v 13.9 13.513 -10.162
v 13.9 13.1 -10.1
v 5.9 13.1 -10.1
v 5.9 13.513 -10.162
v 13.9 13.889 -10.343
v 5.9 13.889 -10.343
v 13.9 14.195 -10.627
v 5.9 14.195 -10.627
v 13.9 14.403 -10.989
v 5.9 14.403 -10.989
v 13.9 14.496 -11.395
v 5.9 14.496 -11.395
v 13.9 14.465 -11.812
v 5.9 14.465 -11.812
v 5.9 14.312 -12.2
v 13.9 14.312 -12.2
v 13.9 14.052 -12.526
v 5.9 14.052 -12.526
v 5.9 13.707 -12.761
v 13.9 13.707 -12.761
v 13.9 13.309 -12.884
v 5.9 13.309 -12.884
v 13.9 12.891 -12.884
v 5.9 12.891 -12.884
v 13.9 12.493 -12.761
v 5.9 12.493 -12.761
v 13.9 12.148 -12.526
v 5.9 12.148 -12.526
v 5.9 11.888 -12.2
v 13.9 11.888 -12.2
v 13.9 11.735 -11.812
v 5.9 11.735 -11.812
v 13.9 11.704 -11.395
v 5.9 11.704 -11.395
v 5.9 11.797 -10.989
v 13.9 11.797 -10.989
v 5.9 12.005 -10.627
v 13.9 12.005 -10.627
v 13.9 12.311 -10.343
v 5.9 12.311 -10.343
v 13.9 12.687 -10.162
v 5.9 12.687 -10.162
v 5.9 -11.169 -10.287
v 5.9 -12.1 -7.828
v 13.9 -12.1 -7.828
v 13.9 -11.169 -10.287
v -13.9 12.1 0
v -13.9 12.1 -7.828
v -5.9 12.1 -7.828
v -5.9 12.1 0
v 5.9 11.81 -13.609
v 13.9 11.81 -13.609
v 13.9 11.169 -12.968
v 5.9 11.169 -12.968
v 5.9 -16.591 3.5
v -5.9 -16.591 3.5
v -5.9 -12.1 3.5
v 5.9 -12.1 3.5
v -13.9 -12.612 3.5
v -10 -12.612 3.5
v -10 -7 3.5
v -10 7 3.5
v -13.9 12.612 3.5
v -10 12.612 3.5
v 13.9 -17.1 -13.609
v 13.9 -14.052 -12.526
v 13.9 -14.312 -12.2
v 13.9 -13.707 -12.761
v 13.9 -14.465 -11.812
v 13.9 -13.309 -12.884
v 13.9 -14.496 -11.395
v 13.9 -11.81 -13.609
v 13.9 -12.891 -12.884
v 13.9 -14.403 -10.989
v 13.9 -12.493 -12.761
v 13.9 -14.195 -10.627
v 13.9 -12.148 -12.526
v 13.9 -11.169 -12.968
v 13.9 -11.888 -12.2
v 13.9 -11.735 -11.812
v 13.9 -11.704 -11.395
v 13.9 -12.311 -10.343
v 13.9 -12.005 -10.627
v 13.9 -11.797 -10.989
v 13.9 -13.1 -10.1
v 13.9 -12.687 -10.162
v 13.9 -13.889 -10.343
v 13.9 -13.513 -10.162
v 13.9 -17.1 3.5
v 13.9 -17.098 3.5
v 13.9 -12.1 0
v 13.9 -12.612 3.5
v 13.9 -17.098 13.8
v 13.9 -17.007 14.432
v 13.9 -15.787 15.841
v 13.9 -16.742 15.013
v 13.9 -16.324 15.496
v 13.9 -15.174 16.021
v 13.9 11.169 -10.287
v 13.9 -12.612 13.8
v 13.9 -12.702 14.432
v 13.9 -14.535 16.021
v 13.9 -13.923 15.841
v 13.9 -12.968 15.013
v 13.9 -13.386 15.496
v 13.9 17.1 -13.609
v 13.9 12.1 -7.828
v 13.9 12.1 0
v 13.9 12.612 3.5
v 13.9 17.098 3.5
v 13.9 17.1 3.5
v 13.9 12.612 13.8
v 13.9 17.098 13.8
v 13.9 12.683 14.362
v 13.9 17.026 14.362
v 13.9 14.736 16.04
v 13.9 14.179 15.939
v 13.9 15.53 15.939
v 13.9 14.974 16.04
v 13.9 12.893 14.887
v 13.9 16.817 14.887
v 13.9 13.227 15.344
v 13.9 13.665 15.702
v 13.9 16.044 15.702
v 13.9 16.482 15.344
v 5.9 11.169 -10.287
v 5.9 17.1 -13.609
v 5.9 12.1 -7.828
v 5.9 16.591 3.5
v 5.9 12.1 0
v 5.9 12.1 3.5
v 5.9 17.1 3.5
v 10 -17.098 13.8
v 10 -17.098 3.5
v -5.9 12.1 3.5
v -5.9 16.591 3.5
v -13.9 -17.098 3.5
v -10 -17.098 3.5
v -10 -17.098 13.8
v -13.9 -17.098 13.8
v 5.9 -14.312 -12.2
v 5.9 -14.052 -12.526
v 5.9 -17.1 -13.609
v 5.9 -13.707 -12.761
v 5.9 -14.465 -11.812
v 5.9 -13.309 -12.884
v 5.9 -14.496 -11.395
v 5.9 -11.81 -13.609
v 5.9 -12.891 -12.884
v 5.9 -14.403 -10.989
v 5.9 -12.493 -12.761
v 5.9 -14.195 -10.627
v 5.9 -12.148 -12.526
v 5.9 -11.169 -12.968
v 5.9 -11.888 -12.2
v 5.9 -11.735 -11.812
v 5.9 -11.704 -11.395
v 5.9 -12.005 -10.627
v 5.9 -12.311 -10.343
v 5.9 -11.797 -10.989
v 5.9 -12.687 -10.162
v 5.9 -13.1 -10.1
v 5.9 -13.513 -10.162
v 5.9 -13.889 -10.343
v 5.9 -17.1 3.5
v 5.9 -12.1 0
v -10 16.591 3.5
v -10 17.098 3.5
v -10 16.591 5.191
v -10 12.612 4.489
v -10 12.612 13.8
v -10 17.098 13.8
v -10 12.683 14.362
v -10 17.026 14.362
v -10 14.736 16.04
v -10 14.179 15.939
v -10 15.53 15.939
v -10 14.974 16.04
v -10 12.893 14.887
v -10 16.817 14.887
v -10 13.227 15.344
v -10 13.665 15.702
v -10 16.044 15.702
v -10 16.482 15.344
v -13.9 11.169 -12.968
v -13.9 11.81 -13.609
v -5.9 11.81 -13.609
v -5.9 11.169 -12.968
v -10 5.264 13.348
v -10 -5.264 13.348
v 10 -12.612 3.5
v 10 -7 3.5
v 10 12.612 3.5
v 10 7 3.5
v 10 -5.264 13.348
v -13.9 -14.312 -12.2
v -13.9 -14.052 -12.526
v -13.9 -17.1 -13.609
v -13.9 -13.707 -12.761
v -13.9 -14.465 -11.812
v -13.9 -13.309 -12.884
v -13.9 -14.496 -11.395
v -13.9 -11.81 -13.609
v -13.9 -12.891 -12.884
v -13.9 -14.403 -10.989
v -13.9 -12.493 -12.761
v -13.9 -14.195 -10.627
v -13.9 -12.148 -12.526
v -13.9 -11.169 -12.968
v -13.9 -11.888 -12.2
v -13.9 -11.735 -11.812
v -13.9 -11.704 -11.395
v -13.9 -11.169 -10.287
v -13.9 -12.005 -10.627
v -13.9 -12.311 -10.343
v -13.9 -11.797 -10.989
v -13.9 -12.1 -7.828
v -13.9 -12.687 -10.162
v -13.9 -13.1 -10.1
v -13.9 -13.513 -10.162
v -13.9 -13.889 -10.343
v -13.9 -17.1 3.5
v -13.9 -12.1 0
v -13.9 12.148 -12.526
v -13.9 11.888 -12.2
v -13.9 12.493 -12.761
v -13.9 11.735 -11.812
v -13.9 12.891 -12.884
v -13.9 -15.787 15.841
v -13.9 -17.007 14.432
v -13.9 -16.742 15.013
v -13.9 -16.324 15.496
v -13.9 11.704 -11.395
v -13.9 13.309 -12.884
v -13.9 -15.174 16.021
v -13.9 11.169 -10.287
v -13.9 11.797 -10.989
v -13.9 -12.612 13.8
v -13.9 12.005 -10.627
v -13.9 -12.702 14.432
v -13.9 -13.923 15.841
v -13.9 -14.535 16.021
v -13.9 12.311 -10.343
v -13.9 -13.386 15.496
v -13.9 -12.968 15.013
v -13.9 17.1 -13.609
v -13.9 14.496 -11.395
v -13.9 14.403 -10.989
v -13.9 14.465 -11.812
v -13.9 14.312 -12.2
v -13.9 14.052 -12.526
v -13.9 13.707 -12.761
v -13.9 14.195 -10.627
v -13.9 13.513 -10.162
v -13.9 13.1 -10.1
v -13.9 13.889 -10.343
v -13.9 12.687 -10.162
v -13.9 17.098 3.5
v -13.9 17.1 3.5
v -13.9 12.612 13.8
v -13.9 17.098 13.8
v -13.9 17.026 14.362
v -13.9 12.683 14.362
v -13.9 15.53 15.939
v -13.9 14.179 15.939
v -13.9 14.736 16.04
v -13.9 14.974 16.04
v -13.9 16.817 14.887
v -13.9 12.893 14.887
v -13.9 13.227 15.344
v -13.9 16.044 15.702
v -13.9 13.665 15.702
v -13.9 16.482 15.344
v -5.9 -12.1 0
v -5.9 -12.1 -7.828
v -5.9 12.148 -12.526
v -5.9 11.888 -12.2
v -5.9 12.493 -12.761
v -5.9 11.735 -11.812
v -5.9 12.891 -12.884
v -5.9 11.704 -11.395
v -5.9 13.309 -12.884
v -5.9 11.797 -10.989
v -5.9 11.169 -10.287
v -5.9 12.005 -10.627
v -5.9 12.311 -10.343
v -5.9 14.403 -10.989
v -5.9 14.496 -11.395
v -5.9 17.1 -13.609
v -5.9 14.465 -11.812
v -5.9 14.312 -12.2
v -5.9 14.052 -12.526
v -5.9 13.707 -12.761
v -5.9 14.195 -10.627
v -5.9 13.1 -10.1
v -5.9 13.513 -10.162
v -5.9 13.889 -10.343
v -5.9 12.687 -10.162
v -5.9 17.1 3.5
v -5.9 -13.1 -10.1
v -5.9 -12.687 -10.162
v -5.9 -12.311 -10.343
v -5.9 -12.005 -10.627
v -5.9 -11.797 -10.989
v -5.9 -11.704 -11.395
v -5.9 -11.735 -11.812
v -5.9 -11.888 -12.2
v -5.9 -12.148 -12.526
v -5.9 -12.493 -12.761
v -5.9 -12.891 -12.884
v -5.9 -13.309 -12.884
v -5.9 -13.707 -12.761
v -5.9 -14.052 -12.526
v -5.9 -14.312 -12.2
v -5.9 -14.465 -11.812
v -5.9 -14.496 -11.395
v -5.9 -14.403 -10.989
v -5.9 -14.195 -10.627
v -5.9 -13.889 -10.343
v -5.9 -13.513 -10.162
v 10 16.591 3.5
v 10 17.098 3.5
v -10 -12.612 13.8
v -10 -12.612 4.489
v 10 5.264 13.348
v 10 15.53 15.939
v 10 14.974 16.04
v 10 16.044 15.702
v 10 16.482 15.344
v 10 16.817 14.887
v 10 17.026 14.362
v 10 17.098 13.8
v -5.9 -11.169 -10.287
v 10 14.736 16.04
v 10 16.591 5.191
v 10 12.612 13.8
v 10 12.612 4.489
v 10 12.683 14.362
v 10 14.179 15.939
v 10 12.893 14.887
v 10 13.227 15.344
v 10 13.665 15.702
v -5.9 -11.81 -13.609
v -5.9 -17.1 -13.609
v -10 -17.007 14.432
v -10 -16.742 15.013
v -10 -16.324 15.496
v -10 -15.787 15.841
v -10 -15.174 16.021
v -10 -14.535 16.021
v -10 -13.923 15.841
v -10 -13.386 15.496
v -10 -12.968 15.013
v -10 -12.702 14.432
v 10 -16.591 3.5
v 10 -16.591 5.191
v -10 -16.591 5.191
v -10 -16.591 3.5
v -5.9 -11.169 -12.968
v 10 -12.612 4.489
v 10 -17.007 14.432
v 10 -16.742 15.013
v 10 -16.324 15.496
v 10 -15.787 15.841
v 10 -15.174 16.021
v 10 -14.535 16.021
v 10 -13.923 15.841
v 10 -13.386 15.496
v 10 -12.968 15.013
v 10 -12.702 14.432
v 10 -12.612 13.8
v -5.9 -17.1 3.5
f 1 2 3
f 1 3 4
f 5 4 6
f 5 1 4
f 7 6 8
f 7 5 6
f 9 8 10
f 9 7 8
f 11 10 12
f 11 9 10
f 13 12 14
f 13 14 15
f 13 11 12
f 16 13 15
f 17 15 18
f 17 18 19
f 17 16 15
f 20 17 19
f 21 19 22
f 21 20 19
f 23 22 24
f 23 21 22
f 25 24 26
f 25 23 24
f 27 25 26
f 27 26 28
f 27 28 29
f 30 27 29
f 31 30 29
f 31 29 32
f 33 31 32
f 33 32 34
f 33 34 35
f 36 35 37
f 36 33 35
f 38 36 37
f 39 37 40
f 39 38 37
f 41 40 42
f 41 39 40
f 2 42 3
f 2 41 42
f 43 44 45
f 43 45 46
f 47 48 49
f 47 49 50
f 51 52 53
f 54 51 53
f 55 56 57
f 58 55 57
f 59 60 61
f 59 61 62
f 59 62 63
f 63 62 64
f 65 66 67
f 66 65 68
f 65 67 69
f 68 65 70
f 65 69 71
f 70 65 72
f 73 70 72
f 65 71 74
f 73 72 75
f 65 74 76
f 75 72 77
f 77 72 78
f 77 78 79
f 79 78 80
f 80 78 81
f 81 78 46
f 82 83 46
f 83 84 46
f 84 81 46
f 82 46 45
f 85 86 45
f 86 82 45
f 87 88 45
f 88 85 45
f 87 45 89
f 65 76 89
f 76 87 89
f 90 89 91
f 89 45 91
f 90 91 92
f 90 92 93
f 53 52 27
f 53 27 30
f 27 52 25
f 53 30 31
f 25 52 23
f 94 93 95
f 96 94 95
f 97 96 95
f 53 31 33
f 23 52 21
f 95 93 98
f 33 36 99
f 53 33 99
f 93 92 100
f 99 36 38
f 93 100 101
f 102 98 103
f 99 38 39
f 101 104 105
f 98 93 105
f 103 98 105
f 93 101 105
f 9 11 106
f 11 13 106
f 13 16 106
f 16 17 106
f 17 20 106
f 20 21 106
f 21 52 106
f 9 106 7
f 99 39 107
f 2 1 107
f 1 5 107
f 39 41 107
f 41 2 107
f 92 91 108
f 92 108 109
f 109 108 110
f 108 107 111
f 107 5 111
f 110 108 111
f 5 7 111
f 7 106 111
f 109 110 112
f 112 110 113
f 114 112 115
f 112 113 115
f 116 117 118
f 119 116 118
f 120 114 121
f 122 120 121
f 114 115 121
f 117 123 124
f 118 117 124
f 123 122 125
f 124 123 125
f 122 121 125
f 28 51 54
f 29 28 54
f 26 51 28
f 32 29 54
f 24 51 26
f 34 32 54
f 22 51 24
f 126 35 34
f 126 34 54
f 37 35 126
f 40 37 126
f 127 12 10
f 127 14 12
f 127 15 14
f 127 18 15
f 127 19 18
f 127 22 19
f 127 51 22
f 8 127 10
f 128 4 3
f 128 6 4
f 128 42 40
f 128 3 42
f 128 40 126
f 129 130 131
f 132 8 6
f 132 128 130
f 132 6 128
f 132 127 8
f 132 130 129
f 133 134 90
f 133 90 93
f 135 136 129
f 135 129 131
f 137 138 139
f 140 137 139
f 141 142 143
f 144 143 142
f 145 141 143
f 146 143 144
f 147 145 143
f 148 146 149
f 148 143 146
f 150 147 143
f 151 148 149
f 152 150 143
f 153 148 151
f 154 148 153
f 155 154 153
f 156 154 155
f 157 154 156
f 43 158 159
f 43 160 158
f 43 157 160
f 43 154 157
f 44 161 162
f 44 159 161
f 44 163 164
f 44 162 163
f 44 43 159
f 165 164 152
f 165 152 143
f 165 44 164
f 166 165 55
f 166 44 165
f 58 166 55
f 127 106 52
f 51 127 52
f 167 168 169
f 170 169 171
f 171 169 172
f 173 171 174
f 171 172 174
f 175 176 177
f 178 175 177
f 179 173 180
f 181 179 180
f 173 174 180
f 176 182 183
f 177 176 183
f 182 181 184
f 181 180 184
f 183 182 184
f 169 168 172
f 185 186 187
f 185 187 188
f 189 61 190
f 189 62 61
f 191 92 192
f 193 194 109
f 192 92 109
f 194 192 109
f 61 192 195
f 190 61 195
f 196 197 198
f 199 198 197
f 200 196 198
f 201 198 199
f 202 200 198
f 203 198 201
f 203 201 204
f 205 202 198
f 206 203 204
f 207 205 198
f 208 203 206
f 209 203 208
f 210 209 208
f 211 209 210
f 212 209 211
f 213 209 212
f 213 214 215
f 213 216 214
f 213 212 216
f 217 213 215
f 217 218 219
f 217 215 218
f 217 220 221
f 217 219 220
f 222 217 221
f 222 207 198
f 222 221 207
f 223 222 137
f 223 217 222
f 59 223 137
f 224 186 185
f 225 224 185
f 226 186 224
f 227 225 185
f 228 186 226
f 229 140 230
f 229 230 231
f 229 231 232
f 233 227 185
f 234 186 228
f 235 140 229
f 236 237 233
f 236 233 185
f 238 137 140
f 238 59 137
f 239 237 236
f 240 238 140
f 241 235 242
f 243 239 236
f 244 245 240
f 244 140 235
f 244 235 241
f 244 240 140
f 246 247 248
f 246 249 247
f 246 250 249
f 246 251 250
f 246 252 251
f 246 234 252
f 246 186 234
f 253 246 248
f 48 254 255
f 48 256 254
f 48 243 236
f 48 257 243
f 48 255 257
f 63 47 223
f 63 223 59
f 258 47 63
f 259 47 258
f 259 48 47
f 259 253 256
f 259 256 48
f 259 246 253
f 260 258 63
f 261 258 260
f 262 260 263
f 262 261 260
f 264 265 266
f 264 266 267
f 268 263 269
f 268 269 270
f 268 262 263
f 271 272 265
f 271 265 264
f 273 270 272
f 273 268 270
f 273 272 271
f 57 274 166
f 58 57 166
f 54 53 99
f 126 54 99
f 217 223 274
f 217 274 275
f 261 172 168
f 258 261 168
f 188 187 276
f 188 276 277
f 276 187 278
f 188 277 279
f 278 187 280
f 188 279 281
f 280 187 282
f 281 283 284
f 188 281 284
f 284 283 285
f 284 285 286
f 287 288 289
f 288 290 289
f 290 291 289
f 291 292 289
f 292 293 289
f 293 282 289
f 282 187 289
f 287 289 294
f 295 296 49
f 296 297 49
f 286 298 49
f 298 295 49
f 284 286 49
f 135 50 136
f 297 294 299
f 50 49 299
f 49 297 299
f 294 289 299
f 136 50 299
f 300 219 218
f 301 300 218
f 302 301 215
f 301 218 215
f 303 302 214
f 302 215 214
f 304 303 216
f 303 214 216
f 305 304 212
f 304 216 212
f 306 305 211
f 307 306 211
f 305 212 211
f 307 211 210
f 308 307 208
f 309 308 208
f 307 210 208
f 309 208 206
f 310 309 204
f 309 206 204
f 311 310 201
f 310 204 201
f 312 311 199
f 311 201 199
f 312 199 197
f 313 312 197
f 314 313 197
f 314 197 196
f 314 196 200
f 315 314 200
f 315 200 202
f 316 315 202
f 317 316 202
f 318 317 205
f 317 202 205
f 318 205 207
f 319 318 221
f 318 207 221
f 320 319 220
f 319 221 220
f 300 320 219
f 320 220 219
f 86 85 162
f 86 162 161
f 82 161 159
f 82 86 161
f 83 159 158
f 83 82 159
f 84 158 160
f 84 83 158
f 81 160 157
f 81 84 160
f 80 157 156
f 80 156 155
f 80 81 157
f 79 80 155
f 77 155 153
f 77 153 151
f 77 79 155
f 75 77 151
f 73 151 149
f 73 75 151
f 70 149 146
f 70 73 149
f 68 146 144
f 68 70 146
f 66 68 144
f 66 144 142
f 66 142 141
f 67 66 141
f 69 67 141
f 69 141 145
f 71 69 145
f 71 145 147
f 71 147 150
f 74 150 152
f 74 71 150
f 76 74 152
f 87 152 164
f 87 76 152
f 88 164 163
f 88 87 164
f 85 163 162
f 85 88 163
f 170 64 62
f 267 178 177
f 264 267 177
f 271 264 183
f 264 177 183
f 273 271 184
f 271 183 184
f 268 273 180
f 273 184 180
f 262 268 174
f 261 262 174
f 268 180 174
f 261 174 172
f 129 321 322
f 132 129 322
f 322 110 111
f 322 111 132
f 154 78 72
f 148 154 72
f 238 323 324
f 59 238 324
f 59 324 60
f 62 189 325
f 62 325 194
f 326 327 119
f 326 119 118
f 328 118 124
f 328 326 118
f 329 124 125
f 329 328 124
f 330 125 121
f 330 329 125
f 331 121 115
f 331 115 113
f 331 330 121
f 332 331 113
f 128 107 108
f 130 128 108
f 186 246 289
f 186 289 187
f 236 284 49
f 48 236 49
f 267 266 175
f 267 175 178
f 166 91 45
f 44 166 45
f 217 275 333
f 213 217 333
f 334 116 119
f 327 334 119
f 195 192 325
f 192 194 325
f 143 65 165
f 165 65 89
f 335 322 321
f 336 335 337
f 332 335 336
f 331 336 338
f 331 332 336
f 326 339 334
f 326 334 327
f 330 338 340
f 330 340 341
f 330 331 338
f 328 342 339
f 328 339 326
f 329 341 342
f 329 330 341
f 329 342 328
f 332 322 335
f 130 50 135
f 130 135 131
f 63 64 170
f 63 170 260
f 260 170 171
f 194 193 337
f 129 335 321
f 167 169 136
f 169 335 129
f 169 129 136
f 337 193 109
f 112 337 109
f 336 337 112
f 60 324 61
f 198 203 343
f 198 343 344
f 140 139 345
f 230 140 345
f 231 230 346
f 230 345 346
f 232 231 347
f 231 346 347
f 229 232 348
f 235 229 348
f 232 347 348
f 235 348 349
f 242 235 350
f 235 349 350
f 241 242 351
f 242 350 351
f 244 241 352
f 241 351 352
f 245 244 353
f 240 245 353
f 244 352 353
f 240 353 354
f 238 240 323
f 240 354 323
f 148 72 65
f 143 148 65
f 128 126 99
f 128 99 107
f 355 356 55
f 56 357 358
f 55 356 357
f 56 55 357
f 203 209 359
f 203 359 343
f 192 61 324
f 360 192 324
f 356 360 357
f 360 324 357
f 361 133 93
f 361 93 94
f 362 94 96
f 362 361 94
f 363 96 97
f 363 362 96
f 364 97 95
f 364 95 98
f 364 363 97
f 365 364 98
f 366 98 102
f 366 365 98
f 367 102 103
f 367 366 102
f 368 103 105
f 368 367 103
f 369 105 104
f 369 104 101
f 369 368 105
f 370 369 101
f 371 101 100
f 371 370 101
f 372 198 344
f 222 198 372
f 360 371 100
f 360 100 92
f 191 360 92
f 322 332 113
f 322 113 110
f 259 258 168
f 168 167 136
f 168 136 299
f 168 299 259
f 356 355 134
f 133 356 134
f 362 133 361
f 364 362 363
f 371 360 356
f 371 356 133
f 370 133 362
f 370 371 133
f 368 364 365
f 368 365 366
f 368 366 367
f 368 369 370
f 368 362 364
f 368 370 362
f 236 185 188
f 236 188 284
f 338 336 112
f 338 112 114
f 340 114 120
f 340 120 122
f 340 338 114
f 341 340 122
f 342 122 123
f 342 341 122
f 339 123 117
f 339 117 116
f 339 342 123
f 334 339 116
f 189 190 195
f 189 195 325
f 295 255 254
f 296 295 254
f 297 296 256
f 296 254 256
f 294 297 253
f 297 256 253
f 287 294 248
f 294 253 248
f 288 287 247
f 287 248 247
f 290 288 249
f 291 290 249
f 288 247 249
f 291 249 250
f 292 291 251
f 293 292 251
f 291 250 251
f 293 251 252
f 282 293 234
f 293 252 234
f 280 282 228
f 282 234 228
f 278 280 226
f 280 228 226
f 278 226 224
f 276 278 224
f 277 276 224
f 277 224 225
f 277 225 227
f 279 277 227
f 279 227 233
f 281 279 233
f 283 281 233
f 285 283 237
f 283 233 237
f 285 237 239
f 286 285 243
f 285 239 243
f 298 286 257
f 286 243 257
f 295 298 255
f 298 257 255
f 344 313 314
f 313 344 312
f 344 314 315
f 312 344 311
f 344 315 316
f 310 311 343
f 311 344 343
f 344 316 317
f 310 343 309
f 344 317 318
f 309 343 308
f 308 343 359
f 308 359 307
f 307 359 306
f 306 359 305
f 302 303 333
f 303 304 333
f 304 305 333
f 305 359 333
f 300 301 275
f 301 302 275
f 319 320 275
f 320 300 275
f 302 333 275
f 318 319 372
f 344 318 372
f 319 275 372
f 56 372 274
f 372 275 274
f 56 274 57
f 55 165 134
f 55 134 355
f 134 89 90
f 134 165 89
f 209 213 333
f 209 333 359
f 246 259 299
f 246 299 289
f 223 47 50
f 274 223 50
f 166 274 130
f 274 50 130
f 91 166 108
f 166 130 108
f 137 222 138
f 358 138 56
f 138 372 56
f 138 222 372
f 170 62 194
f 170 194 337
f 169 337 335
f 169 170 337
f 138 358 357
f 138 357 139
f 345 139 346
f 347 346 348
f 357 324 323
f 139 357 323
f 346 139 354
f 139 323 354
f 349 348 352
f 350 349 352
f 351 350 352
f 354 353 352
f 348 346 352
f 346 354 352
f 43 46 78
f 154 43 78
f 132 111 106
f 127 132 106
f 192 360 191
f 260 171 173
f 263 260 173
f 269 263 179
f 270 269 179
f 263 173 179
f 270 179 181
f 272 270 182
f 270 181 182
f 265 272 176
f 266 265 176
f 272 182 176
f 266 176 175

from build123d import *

# Parameters (mm, degrees)
SKETCH_1_W            = 27.8
SKETCH_1_H            = 24.2
EXTRUDE_1_DEPTH       = 5
SKETCH_5_R            = 1.4
EXTRUDE_5_DEPTH       = 8
SKETCH_8_W            = 1.5
SKETCH_8_H            = 34.2
CUT_EXTRUDE_1_DEPTH   = 30
EXTRUDE_11_DEPTH      = 10
EXTRUDE_11_DEPTH_BACK = 10
EXTRUDE_12_DEPTH      = 3.9


with BuildPart() as part:
    # 草图1 → 凸台-拉伸1 (new body)
    with BuildSketch(Plane.XY):
        Rectangle(SKETCH_1_W, SKETCH_1_H)
    extrude(amount=EXTRUDE_1_DEPTH)

    # 草图5 → 凸台-拉伸5 (add)
    # profile 1 of 2: a face of its own
    with BuildSketch(Plane.ZY.offset(13.9)):
        Polygon((-11.5, -11.168960062), (-12.967909623, -11.168960062), (-13.608884892, -11.809935331), (-13.608884892, -17.1), (-11.5, -17.1), (5, -17.1), (5, -12.1), (0, -12.1), (-7.82761802, -12.1), (-10.28681363, -11.168960062), align=None)
        with Locations((-11.5, -13.1)):
            Circle(SKETCH_5_R, mode=Mode.SUBTRACT)
    # profile 2 of 2: a face of its own
    with BuildSketch(Plane.ZY.offset(13.9)):
        Polygon((5, 12.1), (5, 17.1), (-11.5, 17.1), (-13.608884892, 17.1), (-13.608884892, 11.809935331), (-12.967909623, 11.168960062), (-11.5, 11.168960062), (-10.28681363, 11.168960062), (-7.82761802, 12.1), (0, 12.1), align=None)
        with Locations((-11.5, 13.1)):
            Circle(SKETCH_5_R, mode=Mode.SUBTRACT)
    extrude_5 = extrude(amount=-EXTRUDE_5_DEPTH)

    # 镜向1: 凸台-拉伸5 across plane
    add(extrude_5.mirror(Plane(origin=(0, 0, 0), x_dir=(0, 0, 1), z_dir=(1, 0, 0))))

    # 草图8 → 切除-拉伸1 (cut)
    with BuildSketch(Plane(origin=(13.9, 0, 0), x_dir=(0, 0, -1), z_dir=(1, 0, 0))):
        with Locations((-4.25, 0)):
            Rectangle(SKETCH_8_W, SKETCH_8_H)
    extrude(amount=-CUT_EXTRUDE_1_DEPTH, mode=Mode.SUBTRACT)

    # 草图10 → 凸台-拉伸11 (add, two sides: drawn at the far end of the back side and taken through both)
    with BuildSketch(Plane(origin=(0, 0, 0), x_dir=(0, 0, -1), z_dir=(1, 0, 0)).offset(-EXTRUDE_11_DEPTH_BACK)):
        Polygon((-3.5, -7), (-13.34807753, -5.263518223), (-13.34807753, 5.263518223), (-3.5, 7), align=None)
        Polygon((-3.5, 16.591331578), (-3.5, 7), (-5.191210538, 16.591331578), align=None)
        Polygon((-5.191210538, -16.591331578), (-3.5, -16.591331578), (-3.5, -7), align=None)
    extrude(amount=EXTRUDE_11_DEPTH + EXTRUDE_11_DEPTH_BACK)

    # 草图11 → 凸台-拉伸12 (add)
    with BuildSketch(Plane.ZY.offset(10)):
        with BuildLine():
            Line((5.191210538, 16.591331578), (4.489460182, 12.611507539))
            Line((4.489460182, 12.611507539), (13.800354116, 12.611507539))
            ThreePointArc((13.800354116, 12.611507539), (15.343887855, 13.227011755), (16.040354116, 14.735745196))
            Line((16.040354116, 14.735745196), (16.040354116, 14.973578462))
            ThreePointArc((16.040354116, 14.973578462), (15.343887855, 16.482311902), (13.800354116, 17.097816118))
            Line((13.800354116, 17.097816118), (3.5, 17.097816118))
            Line((3.5, 17.097816118), (3.5, 16.591331578))
            Line((3.5, 16.591331578), (5.191210538, 16.591331578))
        make_face()
        with BuildLine():
            Line((3.5, -17.097816118), (13.800354116, -17.097816118))
            ThreePointArc((13.800354116, -17.097816118), (16.043508405, -14.854661829), (13.800354116, -12.611507539))
            Line((13.800354116, -12.611507539), (3.5, -12.611507539))
            Line((3.5, -12.611507539), (3.5, -17.097816118))
        make_face()
        Polygon((3.5, 16.591331578), (3.5, 12.611507539), (4.489460182, 12.611507539), (5.191210538, 16.591331578), align=None)
    extrude_12 = extrude(amount=EXTRUDE_12_DEPTH)

    # 镜向3: 凸台-拉伸12 across plane
    add(extrude_12.mirror(Plane(origin=(0, 0, 0), x_dir=(0, 0, 1), z_dir=(1, 0, 0))))


solid = part.part
